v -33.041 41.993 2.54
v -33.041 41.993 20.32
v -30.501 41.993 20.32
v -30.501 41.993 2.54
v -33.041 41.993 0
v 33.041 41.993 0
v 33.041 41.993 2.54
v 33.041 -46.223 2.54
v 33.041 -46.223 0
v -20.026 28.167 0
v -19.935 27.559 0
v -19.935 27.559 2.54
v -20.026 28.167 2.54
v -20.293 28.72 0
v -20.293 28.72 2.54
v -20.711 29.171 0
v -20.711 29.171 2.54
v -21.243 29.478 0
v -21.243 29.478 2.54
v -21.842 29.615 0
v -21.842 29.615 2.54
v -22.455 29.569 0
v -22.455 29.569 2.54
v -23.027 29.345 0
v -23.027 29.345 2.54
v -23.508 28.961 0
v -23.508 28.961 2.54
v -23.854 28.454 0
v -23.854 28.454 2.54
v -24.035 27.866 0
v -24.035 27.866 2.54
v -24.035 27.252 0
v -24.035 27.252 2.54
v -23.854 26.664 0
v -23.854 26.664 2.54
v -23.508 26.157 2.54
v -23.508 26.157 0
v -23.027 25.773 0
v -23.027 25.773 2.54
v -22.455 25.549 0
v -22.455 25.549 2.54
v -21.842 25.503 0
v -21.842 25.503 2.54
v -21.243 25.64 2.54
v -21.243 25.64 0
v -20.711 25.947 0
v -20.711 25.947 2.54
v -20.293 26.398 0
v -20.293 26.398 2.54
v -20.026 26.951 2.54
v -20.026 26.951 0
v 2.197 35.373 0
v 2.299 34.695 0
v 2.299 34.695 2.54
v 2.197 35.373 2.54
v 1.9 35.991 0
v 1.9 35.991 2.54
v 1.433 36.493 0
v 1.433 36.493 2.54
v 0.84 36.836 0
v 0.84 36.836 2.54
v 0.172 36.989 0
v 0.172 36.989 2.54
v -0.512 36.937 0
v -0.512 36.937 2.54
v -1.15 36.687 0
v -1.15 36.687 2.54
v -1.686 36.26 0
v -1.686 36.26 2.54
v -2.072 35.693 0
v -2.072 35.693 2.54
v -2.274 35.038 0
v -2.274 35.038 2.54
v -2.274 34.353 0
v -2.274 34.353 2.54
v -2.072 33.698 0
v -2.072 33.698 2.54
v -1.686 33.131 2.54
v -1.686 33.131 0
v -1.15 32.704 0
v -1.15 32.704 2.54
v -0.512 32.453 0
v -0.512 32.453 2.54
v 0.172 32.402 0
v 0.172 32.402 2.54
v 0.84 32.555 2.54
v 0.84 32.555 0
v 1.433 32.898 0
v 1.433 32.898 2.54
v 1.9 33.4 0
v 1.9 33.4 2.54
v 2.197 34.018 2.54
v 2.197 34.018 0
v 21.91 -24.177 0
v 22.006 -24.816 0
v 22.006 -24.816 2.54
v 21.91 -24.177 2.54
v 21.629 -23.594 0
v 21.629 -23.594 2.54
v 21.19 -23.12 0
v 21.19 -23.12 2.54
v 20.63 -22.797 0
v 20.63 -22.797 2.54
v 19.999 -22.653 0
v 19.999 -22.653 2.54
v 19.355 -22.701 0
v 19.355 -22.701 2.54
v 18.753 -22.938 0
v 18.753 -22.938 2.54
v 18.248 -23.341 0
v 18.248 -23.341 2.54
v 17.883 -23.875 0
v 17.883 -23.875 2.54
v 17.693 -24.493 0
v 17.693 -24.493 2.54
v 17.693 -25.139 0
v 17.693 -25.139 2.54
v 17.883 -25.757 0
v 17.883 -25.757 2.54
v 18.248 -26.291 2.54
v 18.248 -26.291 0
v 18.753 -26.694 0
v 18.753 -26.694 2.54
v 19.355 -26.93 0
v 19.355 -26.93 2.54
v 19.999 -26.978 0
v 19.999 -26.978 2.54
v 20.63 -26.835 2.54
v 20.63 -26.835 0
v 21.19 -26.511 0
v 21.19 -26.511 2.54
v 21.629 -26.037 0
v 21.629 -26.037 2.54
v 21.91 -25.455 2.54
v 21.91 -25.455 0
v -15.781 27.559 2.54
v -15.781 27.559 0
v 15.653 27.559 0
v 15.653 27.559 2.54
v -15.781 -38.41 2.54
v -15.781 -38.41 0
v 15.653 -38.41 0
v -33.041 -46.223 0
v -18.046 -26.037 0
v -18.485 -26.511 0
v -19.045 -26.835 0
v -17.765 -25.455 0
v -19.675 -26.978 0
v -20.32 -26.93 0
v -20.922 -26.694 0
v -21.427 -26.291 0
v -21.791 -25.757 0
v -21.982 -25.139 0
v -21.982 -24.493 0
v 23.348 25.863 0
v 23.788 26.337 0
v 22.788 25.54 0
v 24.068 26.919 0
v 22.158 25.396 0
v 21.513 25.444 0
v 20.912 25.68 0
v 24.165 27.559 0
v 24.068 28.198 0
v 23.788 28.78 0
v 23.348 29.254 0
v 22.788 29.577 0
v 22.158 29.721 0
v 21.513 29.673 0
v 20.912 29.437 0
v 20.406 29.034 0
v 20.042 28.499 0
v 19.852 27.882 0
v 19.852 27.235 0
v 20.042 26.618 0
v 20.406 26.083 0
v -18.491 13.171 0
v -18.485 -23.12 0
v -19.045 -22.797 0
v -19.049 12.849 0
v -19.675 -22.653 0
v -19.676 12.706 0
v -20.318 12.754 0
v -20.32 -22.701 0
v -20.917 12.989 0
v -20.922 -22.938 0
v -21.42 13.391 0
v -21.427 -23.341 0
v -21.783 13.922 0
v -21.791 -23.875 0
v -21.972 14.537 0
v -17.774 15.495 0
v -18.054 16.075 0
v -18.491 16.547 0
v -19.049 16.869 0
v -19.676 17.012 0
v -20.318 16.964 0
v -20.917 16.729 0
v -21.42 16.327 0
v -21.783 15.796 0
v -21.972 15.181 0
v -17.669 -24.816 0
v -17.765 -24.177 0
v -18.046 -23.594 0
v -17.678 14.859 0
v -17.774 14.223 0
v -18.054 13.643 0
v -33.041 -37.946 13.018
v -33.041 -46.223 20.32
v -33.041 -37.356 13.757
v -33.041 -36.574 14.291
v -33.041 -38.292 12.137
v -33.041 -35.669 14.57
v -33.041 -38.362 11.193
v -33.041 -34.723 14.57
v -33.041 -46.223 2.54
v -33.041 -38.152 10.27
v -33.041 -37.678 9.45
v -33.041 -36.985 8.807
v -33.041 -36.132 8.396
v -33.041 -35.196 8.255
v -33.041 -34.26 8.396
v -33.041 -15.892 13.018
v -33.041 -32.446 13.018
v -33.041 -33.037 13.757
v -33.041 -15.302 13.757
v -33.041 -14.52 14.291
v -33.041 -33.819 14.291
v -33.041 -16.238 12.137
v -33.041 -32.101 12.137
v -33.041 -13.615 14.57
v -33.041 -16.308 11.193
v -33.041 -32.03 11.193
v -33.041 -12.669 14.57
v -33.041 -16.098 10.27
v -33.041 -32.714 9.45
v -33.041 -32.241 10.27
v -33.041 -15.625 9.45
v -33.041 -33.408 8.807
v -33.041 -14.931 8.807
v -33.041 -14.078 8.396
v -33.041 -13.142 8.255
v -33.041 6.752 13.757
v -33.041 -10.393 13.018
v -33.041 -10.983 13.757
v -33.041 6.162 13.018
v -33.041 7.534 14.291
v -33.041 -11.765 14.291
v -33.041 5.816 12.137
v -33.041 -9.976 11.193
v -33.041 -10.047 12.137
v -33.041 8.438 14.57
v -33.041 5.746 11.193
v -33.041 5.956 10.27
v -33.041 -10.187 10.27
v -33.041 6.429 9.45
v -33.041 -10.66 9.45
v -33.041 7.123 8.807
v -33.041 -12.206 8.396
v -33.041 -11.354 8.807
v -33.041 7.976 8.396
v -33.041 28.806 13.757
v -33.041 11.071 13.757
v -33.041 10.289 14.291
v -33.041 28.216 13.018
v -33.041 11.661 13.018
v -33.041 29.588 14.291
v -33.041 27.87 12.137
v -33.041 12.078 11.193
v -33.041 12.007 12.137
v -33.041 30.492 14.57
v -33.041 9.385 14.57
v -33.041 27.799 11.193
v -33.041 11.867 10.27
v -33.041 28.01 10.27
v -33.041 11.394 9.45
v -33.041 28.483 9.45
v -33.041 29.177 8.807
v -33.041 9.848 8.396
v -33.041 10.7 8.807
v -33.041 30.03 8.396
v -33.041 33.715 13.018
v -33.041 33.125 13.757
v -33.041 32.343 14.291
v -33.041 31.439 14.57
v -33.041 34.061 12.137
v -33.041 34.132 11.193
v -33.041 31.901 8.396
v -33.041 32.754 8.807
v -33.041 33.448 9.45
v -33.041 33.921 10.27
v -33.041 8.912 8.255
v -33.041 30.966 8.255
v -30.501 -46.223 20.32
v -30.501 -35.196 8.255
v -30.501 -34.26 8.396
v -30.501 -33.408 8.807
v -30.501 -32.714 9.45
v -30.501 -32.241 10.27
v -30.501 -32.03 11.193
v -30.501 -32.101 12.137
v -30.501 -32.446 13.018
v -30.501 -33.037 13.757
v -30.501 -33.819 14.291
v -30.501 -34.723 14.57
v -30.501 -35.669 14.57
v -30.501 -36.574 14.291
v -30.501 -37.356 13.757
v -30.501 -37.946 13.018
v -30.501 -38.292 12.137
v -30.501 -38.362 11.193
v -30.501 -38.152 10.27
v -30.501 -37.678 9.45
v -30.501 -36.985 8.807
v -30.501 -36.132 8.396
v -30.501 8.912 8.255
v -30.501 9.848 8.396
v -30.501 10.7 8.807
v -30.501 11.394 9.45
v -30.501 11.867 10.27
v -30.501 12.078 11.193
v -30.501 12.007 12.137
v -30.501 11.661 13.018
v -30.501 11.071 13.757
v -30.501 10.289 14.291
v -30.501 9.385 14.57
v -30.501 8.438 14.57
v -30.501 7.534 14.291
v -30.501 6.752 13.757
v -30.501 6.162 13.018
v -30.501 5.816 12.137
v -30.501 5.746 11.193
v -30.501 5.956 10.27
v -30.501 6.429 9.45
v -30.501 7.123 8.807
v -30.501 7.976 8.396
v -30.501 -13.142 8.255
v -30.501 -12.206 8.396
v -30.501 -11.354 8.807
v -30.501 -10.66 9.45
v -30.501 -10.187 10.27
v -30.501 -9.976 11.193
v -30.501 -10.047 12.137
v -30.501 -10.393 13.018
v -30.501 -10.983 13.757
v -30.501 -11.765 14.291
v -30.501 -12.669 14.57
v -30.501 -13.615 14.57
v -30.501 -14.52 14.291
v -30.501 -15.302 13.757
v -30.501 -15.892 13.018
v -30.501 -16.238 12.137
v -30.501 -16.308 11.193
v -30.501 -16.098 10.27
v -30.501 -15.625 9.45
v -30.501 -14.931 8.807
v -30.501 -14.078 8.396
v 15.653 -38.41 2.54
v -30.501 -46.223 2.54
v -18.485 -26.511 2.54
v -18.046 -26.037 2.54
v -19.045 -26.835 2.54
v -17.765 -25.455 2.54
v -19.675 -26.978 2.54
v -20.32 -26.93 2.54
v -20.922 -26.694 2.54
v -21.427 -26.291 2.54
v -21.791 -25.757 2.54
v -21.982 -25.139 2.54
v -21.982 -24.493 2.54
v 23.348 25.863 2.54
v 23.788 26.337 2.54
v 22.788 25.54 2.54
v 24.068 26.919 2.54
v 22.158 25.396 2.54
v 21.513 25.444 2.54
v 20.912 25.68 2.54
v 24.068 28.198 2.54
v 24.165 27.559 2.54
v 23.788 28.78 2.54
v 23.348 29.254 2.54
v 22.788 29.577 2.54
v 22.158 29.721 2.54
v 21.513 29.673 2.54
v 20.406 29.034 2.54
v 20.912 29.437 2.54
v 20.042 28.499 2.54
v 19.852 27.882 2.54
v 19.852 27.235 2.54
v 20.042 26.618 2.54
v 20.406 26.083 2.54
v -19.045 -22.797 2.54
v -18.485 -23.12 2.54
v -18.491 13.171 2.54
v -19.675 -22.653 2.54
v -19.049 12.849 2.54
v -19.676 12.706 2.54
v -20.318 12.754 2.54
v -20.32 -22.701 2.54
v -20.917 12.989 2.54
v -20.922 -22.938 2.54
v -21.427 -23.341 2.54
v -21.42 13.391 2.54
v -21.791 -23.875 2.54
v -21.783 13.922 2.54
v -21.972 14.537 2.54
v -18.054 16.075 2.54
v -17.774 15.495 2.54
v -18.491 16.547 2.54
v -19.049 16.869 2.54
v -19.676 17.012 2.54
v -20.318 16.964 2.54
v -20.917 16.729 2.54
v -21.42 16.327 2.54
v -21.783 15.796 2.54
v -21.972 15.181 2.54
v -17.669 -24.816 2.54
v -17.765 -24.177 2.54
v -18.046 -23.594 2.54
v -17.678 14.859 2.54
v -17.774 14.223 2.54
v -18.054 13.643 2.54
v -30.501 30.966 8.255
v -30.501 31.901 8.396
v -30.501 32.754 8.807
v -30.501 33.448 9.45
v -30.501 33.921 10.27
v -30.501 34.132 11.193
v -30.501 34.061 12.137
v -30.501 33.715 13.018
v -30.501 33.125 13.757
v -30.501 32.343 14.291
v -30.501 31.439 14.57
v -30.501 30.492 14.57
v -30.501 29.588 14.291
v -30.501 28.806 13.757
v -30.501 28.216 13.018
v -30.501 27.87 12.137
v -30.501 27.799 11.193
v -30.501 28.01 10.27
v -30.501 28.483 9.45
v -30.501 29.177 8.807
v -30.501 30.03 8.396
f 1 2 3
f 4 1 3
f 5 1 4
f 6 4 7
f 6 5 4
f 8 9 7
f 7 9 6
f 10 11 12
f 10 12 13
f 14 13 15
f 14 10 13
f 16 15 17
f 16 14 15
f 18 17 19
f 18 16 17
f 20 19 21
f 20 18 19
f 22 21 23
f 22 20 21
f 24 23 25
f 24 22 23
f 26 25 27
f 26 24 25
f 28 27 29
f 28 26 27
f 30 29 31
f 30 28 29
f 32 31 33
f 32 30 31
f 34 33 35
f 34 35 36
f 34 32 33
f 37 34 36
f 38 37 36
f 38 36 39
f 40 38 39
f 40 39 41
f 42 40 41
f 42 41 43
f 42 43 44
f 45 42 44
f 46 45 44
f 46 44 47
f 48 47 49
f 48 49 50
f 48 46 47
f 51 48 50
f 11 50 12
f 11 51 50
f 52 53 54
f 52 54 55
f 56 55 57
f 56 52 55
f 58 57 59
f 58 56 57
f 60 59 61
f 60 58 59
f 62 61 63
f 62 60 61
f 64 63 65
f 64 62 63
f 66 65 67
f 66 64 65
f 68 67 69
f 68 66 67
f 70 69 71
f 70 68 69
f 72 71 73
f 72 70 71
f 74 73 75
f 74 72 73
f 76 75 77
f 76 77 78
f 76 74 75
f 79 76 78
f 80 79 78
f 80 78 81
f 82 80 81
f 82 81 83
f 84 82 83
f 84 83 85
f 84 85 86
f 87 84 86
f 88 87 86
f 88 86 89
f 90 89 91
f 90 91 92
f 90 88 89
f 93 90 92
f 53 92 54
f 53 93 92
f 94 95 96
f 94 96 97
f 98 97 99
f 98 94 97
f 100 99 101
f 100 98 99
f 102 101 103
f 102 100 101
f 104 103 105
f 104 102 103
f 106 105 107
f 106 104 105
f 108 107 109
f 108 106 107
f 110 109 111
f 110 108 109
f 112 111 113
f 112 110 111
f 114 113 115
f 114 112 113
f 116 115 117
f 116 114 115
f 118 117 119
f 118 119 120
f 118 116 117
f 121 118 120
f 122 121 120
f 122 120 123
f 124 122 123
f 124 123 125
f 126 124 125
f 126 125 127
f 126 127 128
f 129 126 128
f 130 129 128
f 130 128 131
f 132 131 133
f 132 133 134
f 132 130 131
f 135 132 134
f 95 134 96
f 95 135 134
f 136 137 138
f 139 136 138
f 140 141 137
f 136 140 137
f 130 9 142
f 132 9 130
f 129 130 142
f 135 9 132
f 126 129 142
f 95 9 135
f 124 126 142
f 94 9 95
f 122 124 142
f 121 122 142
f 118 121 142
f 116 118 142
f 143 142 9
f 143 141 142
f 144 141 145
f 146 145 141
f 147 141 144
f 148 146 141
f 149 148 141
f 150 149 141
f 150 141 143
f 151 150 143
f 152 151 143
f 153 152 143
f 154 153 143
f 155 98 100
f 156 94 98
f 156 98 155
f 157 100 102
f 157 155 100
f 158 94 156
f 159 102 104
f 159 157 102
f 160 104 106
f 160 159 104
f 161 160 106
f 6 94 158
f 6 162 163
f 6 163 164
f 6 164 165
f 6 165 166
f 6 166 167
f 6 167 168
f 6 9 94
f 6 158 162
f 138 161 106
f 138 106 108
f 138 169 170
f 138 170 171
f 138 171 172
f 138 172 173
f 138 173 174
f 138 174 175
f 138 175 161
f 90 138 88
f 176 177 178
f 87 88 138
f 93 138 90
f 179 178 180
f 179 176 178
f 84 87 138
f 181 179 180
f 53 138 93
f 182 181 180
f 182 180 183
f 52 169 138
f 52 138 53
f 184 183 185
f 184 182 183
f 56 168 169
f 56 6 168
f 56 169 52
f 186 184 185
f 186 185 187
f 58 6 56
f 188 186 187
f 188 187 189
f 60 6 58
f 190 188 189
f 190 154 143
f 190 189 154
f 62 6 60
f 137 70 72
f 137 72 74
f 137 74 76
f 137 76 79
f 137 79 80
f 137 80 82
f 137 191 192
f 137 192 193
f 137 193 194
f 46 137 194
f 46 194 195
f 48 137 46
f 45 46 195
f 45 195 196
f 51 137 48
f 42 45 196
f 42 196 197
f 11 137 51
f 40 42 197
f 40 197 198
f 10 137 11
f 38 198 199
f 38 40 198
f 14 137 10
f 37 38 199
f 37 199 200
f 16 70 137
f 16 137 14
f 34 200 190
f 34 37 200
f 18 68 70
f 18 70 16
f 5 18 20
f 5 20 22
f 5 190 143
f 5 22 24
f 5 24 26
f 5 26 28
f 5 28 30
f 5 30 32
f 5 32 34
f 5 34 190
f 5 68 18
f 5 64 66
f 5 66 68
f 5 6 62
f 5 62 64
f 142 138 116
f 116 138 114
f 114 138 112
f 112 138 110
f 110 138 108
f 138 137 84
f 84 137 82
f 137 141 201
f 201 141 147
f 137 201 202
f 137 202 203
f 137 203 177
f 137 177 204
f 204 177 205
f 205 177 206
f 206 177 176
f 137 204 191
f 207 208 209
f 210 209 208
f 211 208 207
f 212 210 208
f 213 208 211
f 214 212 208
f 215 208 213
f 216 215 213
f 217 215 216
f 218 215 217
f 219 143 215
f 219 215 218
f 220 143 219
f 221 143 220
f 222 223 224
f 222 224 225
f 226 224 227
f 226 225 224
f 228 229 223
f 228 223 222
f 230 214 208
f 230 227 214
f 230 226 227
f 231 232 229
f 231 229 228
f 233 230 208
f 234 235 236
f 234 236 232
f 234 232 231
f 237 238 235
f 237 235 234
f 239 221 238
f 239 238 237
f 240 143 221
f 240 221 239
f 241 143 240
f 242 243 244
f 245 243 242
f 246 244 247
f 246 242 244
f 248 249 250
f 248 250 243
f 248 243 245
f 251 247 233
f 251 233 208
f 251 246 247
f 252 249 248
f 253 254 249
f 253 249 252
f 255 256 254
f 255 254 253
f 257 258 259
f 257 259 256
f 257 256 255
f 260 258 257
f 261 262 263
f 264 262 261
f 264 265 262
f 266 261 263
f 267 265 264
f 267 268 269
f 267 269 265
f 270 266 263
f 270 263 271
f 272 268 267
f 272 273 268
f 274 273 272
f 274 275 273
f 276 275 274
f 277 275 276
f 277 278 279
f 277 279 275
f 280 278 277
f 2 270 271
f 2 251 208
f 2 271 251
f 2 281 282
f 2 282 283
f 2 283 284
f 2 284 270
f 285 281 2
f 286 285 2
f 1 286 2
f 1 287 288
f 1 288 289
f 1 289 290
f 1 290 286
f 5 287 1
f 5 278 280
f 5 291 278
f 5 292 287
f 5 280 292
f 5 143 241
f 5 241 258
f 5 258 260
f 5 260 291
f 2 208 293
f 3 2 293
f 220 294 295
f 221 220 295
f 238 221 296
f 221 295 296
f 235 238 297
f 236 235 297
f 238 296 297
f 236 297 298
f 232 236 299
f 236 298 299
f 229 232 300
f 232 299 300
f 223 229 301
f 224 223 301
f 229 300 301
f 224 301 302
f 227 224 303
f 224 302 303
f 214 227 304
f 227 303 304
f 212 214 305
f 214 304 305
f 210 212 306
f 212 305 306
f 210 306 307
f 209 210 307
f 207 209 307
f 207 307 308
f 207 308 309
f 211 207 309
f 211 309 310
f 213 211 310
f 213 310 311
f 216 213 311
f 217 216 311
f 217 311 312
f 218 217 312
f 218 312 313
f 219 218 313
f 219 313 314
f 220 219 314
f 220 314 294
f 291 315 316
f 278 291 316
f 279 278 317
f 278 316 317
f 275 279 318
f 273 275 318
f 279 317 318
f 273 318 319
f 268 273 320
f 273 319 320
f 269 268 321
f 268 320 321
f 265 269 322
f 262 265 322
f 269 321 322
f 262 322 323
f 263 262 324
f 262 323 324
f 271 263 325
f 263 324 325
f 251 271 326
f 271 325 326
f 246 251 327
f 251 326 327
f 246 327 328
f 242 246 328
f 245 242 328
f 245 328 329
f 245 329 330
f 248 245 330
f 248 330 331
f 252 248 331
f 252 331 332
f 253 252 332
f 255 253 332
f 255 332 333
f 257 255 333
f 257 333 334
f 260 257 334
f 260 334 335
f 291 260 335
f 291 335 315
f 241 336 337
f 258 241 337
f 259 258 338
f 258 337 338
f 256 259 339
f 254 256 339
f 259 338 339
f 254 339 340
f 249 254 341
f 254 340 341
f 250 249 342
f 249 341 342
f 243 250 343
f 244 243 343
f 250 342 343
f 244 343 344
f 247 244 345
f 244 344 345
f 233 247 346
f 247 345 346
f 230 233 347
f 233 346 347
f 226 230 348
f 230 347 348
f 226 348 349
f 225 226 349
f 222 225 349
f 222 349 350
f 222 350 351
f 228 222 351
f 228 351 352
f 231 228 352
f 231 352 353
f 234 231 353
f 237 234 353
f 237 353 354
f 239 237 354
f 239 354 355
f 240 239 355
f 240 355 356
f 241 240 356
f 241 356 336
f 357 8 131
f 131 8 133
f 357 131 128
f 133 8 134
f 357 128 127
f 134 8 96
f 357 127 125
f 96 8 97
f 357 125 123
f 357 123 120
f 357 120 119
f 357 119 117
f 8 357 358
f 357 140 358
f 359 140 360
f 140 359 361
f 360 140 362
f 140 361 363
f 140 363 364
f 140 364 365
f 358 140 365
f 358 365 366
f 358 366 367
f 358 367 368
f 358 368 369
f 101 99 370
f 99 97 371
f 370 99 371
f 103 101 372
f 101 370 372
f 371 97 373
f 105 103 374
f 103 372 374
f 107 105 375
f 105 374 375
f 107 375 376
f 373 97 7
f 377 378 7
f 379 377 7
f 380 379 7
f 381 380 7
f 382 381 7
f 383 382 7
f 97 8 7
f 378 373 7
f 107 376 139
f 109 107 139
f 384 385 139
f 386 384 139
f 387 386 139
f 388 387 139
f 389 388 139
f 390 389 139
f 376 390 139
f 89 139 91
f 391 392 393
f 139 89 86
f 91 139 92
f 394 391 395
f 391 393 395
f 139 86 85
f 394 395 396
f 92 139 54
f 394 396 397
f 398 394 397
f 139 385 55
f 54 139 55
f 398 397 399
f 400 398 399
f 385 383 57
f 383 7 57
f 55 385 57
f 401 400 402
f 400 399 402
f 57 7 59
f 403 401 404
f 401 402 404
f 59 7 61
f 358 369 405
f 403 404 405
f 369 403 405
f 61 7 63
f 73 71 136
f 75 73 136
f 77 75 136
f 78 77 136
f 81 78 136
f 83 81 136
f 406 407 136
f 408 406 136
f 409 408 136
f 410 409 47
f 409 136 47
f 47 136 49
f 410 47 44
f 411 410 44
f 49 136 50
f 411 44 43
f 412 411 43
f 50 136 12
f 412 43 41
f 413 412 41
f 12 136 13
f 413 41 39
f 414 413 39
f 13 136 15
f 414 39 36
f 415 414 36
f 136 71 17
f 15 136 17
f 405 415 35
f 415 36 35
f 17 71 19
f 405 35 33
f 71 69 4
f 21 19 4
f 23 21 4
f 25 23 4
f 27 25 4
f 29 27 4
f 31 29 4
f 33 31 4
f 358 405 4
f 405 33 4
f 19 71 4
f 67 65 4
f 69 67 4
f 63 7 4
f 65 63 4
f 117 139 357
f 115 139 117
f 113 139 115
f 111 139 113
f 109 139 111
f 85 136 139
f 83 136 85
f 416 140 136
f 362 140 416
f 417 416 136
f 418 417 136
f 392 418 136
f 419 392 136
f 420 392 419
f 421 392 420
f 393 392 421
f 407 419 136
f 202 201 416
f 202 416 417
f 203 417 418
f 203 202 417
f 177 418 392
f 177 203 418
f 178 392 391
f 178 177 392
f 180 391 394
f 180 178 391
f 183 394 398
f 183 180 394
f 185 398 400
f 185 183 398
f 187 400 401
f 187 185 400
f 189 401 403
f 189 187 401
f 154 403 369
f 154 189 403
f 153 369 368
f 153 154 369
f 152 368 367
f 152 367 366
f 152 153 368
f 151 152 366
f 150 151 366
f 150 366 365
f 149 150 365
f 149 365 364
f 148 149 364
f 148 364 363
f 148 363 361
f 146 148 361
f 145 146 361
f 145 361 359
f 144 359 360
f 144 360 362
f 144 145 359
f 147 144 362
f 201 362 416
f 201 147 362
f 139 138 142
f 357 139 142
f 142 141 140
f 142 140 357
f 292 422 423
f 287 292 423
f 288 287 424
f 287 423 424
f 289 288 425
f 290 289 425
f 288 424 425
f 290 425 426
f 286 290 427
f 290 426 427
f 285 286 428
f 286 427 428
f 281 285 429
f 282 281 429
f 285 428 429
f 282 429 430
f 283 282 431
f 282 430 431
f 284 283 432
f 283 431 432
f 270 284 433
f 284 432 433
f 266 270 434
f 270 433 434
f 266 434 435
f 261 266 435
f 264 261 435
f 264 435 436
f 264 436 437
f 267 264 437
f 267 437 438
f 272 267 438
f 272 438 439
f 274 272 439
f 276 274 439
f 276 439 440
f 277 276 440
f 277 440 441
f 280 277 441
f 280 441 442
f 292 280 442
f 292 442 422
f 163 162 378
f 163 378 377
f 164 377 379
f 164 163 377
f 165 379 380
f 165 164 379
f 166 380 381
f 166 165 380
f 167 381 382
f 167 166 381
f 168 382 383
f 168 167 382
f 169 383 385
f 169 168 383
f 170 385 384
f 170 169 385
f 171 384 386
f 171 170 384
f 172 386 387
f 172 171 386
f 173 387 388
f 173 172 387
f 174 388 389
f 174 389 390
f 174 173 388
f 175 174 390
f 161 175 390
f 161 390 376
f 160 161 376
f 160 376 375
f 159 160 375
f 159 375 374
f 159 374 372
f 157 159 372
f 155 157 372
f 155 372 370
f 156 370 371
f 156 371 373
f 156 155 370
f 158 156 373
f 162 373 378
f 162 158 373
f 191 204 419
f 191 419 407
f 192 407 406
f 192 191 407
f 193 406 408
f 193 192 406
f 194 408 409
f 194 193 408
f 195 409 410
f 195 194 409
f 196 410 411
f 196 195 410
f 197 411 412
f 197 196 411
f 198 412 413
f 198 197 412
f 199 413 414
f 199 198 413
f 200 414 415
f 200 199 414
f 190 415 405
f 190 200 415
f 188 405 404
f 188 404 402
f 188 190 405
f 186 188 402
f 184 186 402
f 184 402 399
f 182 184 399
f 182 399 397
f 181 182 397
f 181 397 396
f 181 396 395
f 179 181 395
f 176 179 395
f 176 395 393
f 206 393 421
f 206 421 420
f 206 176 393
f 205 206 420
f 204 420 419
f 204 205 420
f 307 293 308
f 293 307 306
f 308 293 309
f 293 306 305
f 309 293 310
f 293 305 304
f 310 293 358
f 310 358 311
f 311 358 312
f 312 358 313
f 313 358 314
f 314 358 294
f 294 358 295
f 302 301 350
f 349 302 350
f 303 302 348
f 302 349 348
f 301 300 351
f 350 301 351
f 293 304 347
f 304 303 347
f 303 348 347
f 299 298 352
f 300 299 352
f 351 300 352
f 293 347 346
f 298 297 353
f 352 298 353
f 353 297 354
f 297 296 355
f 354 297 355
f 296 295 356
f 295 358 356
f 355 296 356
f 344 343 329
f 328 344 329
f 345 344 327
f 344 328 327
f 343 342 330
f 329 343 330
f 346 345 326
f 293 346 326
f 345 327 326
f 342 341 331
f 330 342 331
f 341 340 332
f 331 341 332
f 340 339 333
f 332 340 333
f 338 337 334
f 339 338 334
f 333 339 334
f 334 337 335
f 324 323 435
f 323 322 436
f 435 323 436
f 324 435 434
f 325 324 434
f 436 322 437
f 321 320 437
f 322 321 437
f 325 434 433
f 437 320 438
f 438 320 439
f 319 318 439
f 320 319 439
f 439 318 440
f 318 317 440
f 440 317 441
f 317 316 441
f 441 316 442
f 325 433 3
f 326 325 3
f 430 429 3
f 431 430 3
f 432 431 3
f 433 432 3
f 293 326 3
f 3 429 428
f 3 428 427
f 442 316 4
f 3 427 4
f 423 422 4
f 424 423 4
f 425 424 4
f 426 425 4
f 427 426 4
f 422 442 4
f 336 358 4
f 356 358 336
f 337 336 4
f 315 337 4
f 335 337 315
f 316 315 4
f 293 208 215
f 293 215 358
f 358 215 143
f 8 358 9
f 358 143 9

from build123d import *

# Parameters (mm, degrees)
SKETCH2_R           = 2.168725958
SKETCH2_R_2         = 2.299626563
SKETCH2_R_3         = 2.061813599
SKETCH2_R_4         = 2.159
BOSS_EXTRUDE1_DEPTH = 2.54
SKETCH3_W           = 2.54
SKETCH3_H           = 88.215633797
BOSS_EXTRUDE2_DEPTH = 17.78
SKETCH5_R           = 3.175
CUT_EXTRUDE2_DEPTH  = 17.78


with BuildPart() as part:
    # Sketch2 → Boss-Extrude1 (new body)
    with BuildSketch(Plane.XY):
        Polygon((33.041228817, 37.6809), (33.041228817, 9.671924958), (33.041228817, -38.409527683), (33.041228817, -46.223073917), (-33.041228817, -46.223073917), (-33.041228817, -38.409527683), (-33.041228817, 9.671924958), (-33.041228817, 37.6809), (-33.041228817, 41.99255988), (33.041228817, 41.99255988), align=None)
        with Locations((19.8374, -24.8158)):
            Circle(SKETCH2_R, mode=Mode.SUBTRACT)
        with Locations((21.996003552, 27.558503658)):
            Circle(SKETCH2_R, mode=Mode.SUBTRACT)
        with Locations((-0.000312071, 34.695463786)):
            Circle(SKETCH2_R_2, mode=Mode.SUBTRACT)
        with Locations((-21.9964, 27.559)):
            Circle(SKETCH2_R_3, mode=Mode.SUBTRACT)
        with Locations((-19.8374, 14.859)):
            Circle(SKETCH2_R_4, mode=Mode.SUBTRACT)
        with Locations((-19.8374, -24.8158)):
            Circle(SKETCH2_R, mode=Mode.SUBTRACT)
        Polygon((15.652792396, 9.671924958), (15.652792396, 27.558503658), (-13.85744492, 27.558503658), (-15.780925581, 27.558503658), (-15.780925581, 9.671924958), (-15.780925581, -38.409527683), (15.652792396, -38.409527683), align=None, mode=Mode.SUBTRACT)
    extrude(amount=BOSS_EXTRUDE1_DEPTH)

    # Sketch3 → Boss-Extrude2 (add)
    with BuildSketch(Plane.XY.offset(2.54)):
        with Locations((-31.771228817, -2.115257018)):
            Rectangle(SKETCH3_W, SKETCH3_H)
    extrude(amount=BOSS_EXTRUDE2_DEPTH)

    # Sketch5 → Cut-Extrude2 (cut)
    with BuildSketch(Plane(origin=(-30.501228817, 0, 0), x_dir=(0, 0, -1), z_dir=(1, 0, 0))):
        with Locations((-11.43, -35.196119692)):
            Circle(SKETCH5_R)
        with Locations((-11.43, -13.142211243)):
            Circle(SKETCH5_R)
        with Locations((-11.43, 8.911697206)):
            Circle(SKETCH5_R)
        with Locations((-11.43, 30.965605655)):
            Circle(SKETCH5_R)
    extrude(amount=-CUT_EXTRUDE2_DEPTH, mode=Mode.SUBTRACT)


solid = part.part
